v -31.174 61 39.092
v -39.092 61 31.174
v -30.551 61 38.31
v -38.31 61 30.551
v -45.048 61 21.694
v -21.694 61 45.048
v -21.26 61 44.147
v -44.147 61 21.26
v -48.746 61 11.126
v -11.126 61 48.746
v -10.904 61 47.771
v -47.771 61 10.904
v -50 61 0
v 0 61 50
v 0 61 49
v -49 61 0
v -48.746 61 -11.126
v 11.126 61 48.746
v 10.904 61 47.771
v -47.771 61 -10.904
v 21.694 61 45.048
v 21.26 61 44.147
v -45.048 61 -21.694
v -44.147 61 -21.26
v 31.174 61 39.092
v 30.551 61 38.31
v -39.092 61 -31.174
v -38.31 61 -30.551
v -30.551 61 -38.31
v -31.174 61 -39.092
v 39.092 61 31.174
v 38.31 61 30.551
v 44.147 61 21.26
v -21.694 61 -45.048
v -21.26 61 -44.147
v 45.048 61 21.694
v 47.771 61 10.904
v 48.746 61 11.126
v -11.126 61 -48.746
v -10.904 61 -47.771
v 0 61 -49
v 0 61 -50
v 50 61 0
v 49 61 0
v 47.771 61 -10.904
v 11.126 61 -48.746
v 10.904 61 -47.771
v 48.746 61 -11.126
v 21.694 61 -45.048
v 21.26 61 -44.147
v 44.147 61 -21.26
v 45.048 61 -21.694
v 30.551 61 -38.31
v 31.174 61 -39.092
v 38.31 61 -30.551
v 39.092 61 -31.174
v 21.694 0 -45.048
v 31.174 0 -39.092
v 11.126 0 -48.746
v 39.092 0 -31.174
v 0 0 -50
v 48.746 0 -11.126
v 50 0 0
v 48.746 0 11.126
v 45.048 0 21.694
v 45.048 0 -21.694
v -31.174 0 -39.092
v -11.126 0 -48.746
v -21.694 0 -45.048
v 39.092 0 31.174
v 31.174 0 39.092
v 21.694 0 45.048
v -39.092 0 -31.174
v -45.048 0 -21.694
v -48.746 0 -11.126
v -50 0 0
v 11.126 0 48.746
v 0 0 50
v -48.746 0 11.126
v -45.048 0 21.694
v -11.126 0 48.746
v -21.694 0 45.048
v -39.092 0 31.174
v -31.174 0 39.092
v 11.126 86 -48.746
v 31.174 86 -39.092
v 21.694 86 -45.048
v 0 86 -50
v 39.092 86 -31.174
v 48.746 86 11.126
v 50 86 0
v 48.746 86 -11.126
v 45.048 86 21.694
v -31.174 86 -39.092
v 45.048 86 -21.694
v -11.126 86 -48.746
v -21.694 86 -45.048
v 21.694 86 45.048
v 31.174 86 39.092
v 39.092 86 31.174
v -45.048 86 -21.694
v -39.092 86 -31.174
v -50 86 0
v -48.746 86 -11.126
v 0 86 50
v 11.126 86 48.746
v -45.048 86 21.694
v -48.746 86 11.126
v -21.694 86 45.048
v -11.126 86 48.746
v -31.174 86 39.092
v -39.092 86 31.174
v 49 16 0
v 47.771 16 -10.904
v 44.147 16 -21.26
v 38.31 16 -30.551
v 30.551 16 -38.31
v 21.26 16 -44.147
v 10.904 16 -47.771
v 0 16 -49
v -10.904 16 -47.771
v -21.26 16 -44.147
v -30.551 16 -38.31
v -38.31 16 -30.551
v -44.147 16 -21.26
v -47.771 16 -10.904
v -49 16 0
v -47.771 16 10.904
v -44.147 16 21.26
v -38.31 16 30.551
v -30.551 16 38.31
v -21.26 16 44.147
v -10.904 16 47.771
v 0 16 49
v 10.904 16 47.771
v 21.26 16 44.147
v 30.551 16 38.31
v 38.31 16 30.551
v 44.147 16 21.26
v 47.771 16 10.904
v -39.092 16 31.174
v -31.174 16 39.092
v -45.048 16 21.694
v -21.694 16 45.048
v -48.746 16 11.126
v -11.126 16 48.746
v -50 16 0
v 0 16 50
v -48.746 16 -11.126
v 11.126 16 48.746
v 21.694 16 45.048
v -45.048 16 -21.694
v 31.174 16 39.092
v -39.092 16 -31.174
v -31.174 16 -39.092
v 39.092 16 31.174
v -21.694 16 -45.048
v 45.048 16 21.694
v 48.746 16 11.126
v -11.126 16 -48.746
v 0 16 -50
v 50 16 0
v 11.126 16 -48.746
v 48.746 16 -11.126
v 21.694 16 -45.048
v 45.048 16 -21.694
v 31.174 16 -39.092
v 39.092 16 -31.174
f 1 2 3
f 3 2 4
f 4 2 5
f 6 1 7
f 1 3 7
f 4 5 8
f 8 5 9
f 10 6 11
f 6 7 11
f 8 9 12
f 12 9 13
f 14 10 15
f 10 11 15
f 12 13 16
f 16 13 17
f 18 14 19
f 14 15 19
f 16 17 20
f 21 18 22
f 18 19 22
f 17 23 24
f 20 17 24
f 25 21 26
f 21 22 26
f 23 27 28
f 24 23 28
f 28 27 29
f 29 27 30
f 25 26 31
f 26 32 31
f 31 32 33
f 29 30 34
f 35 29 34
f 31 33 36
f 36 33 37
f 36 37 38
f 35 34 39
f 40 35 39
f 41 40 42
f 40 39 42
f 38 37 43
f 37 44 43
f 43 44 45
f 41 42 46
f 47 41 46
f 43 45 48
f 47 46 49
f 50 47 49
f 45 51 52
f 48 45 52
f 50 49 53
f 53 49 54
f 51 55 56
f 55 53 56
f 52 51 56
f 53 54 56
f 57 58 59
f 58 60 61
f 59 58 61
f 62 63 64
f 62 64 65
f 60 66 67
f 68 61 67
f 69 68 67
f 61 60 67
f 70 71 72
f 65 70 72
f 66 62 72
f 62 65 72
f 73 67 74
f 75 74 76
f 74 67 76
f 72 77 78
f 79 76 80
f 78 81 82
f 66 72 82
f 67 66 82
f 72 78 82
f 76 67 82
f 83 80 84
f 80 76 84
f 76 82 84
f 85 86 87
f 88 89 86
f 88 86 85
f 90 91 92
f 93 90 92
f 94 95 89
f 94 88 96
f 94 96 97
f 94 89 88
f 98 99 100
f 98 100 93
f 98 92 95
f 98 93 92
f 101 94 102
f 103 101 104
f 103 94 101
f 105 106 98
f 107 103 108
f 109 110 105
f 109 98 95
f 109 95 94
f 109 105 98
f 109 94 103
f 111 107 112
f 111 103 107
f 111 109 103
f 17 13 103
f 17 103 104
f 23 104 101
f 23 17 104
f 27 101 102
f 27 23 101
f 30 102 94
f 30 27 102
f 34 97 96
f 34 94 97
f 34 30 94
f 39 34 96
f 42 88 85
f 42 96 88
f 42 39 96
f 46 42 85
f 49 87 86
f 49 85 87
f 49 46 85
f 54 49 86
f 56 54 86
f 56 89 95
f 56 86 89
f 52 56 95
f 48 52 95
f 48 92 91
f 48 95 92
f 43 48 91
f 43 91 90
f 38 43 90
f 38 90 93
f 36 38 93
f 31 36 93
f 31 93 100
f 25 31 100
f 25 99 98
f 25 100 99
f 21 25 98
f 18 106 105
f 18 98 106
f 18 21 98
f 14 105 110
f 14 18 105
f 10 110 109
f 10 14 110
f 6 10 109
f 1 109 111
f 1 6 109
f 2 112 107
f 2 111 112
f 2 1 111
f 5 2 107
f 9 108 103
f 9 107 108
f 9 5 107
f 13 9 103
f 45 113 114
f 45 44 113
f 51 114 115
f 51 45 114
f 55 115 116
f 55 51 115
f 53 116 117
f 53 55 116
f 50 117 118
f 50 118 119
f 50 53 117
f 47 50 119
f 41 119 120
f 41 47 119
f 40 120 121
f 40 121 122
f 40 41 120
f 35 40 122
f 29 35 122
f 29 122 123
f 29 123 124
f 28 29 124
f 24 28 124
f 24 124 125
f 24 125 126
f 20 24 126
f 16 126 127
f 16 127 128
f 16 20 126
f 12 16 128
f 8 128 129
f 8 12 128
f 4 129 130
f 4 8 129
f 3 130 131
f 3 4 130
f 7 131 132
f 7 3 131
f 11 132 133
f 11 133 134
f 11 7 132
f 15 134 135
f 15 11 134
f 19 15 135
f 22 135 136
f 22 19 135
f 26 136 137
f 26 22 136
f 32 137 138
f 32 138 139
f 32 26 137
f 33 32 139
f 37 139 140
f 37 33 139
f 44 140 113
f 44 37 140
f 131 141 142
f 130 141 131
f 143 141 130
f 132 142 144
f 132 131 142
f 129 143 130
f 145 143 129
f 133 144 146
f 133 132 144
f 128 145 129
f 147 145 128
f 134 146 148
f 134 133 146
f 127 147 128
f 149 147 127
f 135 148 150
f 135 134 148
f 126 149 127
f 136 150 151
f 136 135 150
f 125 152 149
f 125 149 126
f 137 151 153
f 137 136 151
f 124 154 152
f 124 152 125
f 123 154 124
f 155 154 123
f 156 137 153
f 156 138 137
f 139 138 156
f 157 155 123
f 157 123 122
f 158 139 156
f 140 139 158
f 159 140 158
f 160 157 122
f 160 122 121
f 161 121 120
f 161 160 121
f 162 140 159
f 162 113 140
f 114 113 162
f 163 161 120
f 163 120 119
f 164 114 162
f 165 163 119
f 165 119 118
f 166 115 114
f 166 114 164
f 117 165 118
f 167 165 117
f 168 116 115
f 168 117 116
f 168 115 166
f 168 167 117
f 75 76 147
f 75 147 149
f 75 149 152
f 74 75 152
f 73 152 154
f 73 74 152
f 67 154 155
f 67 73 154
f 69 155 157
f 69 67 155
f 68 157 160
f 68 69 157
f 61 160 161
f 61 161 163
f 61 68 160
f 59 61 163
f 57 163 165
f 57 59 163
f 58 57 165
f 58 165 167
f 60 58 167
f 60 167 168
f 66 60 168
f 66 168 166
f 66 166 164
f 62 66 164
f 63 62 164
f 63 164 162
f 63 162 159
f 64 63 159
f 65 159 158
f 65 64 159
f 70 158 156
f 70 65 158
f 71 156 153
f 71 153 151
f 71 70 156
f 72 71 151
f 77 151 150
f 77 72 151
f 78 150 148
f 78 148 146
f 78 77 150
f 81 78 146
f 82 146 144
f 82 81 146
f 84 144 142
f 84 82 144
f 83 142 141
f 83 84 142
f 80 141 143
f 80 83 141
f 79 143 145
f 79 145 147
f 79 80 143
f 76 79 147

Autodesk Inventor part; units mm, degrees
ref_plane "YZ Plane" through (0, 0, 0) normal (1, 0, 0) x (0, 1, 0)
ref_plane "XZ Plane" through (0, 0, 0) normal (0, 1, 0) x (-1, 0, 0)
sketch "스케치1" plane through (0, 0, 0) normal (0, 1, 0) x (-1, 0, 0)
  circle A0 centre (0, 0) radius 50
  dimension "d0" = 100
extrude "돌출1" add sketch "스케치1" along normal blind 86
ref_plane "작업 평면1" through (0, 61, 0) normal (0, 1, 0) x (1, 0, 0)
sketch "스케치2" plane through (0, 61, 0) normal (0, 1, 0) x (1, 0, 0)
  circle A0 centre (0, 0) radius 51.5789
  circle A1 centre (0, 0) radius 49
  dimension "d4" = 98
extrude "돌출2" cut sketch "스케치2" against normal blind 45
properties part number "lidar"
